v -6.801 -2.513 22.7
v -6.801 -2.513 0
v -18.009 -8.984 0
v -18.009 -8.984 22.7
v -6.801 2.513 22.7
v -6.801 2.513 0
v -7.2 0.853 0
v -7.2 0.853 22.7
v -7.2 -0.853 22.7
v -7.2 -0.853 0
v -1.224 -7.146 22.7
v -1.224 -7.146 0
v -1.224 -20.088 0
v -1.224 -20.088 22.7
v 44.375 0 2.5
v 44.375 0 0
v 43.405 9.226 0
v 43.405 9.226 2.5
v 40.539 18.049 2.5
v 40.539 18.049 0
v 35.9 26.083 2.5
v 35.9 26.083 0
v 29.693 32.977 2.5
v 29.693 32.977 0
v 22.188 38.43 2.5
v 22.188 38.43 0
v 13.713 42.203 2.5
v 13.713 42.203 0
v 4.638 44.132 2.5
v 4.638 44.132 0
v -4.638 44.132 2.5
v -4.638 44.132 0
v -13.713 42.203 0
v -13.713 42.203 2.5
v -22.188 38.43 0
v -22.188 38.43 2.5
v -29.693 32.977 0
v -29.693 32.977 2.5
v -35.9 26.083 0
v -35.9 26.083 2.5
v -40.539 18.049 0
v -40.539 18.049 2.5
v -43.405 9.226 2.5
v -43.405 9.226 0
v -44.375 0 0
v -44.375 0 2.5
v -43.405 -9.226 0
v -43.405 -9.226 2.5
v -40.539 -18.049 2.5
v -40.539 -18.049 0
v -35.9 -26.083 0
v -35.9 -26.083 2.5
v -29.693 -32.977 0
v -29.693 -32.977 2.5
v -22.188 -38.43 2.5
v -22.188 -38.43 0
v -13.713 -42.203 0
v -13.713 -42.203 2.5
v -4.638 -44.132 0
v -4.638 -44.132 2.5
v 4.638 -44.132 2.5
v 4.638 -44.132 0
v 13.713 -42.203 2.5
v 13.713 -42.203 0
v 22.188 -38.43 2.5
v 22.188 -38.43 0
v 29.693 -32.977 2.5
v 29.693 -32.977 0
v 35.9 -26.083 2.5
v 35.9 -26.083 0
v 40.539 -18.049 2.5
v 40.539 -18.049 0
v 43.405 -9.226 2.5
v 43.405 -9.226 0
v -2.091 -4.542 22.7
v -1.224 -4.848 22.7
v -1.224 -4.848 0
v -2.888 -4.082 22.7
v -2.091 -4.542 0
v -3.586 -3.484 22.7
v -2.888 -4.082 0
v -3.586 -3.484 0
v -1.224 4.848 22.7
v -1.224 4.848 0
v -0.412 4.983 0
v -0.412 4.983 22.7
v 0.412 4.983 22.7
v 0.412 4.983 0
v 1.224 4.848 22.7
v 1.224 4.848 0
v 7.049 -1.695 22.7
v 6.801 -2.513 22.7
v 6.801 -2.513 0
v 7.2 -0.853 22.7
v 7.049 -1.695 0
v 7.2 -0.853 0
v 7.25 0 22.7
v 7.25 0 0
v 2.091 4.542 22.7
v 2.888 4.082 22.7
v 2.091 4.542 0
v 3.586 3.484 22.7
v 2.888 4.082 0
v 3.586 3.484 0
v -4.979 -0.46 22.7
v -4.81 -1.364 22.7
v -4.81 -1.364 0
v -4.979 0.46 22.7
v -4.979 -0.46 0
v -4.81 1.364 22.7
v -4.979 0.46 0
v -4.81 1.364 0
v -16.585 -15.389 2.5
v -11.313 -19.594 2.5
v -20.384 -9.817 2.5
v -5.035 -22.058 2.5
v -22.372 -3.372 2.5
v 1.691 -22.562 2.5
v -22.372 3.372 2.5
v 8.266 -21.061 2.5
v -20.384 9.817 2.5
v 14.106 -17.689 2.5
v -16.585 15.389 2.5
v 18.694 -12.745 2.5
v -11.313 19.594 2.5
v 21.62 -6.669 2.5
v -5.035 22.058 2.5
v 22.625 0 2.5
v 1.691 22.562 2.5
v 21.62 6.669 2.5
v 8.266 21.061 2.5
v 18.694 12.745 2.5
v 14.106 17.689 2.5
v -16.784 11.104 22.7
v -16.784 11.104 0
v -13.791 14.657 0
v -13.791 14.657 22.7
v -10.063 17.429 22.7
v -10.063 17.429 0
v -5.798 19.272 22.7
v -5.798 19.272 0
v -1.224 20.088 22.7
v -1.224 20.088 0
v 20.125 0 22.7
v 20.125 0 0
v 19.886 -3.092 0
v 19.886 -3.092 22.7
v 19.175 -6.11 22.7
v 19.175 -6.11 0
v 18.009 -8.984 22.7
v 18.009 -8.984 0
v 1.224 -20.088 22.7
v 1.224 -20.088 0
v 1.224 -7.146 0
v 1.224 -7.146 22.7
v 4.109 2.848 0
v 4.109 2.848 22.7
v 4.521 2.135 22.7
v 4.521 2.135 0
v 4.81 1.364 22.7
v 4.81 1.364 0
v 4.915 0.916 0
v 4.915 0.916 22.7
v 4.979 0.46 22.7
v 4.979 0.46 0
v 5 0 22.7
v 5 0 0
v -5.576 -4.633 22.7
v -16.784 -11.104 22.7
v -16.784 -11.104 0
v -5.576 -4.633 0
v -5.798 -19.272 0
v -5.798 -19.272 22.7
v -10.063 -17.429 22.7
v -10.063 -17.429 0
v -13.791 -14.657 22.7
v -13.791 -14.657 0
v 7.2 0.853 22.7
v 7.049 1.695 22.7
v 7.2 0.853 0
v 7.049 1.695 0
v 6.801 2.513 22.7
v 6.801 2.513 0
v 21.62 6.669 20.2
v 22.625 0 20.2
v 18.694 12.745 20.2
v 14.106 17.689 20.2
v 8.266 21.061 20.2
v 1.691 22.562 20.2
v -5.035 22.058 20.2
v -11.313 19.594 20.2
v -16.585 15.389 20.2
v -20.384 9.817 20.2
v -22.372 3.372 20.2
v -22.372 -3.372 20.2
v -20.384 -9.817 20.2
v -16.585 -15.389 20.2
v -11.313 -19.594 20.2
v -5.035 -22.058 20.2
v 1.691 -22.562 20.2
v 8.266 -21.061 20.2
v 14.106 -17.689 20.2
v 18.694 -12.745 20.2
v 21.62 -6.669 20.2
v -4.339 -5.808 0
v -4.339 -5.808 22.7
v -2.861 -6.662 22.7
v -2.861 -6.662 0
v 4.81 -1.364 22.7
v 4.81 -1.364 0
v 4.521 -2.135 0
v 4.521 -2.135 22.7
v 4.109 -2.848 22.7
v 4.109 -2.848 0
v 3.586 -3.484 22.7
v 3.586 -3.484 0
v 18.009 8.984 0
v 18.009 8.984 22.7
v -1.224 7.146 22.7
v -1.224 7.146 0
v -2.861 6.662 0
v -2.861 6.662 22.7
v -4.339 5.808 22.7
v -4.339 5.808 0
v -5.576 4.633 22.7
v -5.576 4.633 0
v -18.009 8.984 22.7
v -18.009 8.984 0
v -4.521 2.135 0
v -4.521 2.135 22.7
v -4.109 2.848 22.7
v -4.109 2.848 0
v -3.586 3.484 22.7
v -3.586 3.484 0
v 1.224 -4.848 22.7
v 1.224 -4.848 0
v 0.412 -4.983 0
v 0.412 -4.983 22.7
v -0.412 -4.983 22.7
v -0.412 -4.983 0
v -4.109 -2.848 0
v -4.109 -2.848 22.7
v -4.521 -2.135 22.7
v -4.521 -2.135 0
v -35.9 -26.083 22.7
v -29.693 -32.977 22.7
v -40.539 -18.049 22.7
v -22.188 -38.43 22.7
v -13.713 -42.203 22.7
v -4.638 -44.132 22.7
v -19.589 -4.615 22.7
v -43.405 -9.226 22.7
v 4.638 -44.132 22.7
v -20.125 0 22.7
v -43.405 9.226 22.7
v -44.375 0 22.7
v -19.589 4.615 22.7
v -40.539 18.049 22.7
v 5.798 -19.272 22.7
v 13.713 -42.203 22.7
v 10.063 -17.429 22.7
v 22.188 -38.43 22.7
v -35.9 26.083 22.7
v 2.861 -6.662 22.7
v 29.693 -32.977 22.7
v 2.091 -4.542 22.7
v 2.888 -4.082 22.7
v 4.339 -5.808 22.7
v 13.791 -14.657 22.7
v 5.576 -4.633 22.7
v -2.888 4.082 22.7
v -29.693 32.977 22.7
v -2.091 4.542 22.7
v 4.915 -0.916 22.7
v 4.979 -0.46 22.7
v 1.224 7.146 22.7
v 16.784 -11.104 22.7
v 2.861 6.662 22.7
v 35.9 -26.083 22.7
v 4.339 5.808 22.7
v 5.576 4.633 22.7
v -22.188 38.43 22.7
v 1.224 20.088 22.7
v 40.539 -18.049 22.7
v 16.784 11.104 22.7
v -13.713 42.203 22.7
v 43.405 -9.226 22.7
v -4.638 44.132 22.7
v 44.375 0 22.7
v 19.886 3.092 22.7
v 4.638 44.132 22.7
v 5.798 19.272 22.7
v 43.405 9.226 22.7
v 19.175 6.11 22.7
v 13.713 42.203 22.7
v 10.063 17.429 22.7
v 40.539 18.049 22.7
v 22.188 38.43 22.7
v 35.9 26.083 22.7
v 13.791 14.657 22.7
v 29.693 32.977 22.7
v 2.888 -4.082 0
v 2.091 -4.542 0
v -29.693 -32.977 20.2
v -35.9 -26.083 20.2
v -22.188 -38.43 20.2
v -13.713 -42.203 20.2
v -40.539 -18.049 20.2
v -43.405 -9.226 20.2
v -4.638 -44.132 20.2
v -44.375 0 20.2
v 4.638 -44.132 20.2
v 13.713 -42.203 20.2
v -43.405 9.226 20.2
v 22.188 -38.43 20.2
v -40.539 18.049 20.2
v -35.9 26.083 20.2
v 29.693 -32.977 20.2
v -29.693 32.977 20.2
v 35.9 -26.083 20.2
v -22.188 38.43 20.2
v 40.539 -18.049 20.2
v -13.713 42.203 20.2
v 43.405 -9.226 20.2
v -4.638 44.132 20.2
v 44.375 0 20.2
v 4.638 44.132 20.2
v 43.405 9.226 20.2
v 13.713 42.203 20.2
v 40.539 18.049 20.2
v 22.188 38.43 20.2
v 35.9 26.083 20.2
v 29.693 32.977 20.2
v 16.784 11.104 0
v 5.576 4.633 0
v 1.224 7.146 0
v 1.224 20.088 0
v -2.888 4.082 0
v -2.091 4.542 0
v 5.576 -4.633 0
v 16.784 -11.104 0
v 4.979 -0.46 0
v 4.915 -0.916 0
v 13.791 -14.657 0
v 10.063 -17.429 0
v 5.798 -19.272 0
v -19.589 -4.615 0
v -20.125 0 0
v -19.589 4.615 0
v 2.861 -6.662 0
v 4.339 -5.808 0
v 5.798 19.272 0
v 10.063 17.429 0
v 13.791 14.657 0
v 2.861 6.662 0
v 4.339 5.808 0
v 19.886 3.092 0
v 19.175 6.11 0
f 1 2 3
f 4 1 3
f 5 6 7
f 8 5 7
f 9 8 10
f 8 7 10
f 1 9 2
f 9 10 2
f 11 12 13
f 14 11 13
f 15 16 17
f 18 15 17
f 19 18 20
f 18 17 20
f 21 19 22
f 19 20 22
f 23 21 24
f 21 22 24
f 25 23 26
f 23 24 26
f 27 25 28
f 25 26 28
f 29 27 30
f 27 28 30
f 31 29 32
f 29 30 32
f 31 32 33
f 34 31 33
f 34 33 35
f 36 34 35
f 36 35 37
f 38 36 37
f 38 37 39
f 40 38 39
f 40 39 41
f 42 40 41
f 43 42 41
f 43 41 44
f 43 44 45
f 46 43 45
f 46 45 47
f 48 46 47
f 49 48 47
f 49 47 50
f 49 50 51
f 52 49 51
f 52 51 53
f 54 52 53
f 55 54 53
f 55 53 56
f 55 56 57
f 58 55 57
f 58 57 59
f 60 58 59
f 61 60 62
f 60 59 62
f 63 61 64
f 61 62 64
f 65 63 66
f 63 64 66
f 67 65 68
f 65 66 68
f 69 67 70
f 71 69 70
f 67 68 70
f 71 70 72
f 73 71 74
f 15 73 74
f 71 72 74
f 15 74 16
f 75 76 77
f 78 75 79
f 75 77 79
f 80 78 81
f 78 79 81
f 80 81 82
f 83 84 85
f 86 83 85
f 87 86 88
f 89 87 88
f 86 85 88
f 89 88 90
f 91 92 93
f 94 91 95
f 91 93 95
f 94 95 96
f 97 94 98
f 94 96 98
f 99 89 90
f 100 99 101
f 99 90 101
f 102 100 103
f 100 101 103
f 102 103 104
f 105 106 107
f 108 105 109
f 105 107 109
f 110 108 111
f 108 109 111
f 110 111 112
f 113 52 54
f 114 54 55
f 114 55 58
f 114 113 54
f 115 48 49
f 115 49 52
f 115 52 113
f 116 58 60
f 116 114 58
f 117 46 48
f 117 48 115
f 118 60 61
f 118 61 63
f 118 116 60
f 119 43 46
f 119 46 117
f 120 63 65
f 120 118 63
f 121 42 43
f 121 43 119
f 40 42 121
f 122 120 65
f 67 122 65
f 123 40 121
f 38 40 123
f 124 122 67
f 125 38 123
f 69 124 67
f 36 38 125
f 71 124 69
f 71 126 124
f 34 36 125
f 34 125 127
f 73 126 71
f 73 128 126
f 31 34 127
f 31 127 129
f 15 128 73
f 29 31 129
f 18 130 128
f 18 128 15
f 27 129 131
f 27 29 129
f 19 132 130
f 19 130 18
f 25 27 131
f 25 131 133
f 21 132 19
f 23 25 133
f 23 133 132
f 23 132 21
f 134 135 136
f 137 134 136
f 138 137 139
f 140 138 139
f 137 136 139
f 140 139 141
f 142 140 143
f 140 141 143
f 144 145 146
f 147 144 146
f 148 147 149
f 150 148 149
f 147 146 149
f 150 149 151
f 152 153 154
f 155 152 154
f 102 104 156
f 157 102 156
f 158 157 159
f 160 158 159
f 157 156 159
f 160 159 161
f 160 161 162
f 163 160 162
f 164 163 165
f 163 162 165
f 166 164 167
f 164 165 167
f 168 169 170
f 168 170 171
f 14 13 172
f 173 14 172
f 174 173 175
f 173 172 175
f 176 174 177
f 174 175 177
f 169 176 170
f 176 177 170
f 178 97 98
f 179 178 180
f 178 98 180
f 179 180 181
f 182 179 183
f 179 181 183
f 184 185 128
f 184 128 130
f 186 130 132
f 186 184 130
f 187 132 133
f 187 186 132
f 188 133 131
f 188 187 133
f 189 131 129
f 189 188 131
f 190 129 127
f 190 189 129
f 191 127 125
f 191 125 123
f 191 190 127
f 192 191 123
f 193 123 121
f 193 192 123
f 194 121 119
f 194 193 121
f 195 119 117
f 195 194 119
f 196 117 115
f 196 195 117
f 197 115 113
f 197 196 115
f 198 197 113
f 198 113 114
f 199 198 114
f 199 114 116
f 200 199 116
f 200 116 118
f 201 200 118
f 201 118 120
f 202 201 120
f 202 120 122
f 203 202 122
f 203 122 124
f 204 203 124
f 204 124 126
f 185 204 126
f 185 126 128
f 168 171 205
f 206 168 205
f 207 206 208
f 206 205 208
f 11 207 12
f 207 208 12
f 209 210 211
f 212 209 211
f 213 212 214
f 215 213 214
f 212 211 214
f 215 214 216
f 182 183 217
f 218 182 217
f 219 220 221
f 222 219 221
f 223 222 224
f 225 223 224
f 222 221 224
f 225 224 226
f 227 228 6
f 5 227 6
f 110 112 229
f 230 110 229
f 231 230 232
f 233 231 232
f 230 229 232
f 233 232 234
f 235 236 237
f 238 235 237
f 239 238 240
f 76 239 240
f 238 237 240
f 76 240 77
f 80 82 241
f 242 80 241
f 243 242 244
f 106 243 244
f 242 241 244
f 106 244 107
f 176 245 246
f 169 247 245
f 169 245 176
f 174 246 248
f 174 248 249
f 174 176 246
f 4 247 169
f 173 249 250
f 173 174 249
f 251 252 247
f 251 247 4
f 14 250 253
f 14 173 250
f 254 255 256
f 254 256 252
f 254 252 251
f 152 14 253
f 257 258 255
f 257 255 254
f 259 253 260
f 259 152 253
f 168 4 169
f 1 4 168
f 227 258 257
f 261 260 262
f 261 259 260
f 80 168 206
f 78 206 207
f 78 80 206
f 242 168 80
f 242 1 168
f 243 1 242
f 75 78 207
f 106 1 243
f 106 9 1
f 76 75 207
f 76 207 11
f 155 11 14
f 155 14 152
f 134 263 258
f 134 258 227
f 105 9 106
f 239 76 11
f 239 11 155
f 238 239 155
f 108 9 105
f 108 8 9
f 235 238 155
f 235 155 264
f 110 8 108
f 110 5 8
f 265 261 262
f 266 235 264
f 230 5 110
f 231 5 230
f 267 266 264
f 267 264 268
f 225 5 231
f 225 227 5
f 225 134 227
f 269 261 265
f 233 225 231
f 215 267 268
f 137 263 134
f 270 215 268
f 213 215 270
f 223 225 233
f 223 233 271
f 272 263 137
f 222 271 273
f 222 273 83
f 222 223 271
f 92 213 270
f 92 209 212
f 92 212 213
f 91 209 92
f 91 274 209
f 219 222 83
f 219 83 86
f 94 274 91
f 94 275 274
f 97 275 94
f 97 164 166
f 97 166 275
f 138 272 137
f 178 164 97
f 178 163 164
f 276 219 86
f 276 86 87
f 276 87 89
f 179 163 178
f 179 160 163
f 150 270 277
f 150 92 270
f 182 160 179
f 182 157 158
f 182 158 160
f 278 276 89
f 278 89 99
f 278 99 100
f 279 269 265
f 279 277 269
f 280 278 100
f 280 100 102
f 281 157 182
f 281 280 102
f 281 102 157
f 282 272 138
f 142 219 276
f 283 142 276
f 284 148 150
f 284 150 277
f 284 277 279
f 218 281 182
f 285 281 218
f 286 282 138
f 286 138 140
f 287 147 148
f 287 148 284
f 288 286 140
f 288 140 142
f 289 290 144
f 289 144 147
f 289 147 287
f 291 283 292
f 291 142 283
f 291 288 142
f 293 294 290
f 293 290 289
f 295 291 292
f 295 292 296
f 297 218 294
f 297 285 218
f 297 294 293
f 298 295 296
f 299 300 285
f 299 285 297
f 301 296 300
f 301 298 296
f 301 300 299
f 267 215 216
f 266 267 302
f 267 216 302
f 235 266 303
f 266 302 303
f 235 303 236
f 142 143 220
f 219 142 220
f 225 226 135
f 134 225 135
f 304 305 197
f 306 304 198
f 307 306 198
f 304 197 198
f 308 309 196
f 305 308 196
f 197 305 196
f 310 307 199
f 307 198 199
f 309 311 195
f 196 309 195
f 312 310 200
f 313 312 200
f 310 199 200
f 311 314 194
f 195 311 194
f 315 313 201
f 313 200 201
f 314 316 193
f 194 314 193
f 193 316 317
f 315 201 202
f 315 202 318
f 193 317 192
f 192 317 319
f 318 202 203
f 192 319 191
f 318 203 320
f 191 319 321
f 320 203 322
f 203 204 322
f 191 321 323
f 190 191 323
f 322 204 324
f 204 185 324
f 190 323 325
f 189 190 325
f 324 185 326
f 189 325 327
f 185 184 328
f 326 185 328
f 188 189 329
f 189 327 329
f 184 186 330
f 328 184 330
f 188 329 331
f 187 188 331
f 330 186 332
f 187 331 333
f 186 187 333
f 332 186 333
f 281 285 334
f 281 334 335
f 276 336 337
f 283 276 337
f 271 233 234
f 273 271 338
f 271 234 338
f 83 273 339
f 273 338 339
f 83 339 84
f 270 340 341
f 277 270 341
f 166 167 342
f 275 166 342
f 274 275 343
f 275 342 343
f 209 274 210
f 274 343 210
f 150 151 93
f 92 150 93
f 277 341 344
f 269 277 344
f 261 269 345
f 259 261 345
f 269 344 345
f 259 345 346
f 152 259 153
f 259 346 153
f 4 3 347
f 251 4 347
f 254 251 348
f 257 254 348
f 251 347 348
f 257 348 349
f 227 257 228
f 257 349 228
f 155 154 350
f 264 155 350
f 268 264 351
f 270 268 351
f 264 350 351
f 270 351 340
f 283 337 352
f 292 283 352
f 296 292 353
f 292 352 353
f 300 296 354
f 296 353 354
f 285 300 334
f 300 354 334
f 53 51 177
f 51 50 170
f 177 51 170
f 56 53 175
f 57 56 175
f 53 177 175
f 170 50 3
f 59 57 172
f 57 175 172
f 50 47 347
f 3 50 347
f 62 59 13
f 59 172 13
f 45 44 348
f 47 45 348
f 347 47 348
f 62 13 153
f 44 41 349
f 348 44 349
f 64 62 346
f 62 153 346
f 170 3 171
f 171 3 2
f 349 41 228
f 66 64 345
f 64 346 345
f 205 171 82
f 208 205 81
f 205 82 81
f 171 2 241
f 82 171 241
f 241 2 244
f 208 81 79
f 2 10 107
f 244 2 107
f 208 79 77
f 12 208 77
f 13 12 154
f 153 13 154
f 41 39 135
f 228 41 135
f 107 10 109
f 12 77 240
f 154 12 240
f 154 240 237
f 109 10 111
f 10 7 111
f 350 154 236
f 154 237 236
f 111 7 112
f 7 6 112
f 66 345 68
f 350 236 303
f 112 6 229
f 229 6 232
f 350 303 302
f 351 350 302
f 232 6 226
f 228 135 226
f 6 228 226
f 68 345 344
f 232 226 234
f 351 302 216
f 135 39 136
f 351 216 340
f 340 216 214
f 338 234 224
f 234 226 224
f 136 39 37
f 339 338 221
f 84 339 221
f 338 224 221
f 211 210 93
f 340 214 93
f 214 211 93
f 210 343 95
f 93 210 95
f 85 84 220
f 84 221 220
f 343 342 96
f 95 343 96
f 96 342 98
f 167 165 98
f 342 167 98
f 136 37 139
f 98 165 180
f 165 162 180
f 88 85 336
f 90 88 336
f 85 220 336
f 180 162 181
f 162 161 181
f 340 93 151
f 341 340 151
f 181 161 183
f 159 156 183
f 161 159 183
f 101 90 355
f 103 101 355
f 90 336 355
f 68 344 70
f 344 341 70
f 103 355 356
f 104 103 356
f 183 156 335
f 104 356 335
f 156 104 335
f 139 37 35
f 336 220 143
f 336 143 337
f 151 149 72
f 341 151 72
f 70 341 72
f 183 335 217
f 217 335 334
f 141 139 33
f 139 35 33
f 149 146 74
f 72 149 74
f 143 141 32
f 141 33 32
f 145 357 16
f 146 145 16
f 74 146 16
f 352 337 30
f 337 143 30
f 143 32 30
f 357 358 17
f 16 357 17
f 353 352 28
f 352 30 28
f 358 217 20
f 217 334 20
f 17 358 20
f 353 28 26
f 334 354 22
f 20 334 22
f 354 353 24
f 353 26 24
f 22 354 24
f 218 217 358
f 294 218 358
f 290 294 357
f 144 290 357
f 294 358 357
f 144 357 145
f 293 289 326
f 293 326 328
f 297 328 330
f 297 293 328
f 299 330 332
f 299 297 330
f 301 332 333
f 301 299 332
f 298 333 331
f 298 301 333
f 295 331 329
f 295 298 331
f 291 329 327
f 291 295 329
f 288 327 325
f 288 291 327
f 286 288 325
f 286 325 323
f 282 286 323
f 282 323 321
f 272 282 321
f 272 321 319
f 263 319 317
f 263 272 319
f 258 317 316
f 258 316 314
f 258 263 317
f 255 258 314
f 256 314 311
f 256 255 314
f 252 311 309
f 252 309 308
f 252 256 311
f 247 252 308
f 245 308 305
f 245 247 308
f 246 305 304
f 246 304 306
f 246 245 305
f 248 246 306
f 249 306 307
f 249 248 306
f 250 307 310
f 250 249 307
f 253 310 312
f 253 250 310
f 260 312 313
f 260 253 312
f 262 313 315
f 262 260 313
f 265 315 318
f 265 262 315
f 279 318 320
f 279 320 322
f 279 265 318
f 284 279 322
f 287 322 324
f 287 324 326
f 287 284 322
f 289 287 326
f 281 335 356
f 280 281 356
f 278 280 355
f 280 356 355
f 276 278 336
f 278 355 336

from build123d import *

# Parameters (mm, degrees)
F0_R     = 44.375
F1_DEPTH = 22.7
F2_R     = 44.375
F2_R_2   = 22.625
F3_DEPTH = 20.2
F4_R     = 44.375
F4_R_2   = 22.625
F5_DEPTH = 2.5


with BuildPart() as f1:
    # F0 (on Top) → F1 (new body)
    with BuildSketch(Plane.XY):
        Circle(F0_R)
        with BuildLine():
            ThreePointArc((18.0086459229, 8.9835570362), (19.5887674982, 4.6147386601), (20.125, 0))
            ThreePointArc((20.125, 0), (19.5887674982, -4.6147386601), (18.0086459229, -8.9835570362))
            Line((18.0086459229, -8.9835570362), (19.3430855029, -9.753996087))
            Line((19.3430855029, -9.753996087), (18.1187511512, -11.8746053896))
            Line((18.1187511512, -11.8746053896), (16.7843115712, -11.1041663389))
            ThreePointArc((16.7843115712, -11.1041663389), (10.0625, -17.4287612512), (1.2243343517, -20.0877233751))
            Line((1.2243343517, -20.0877233751), (1.2243343517, -21.6286014766))
            Line((1.2243343517, -21.6286014766), (-1.2243343517, -21.6286014766))
            Line((-1.2243343517, -21.6286014766), (-1.2243343517, -20.0877233751))
            ThreePointArc((-1.2243343517, -20.0877233751), (-10.0625, -17.4287612512), (-16.7843115712, -11.1041663389))
            Line((-16.7843115712, -11.1041663389), (-18.1187511512, -11.8746053896))
            Line((-18.1187511512, -11.8746053896), (-19.3430855029, -9.753996087))
            Line((-19.3430855029, -9.753996087), (-18.0086459229, -8.9835570362))
            ThreePointArc((-18.0086459229, -8.9835570362), (-20.125, 0), (-18.0086459229, 8.9835570362))
            Line((-18.0086459229, 8.9835570362), (-19.3430855029, 9.753996087))
            Line((-19.3430855029, 9.753996087), (-18.1187511512, 11.8746053896))
            Line((-18.1187511512, 11.8746053896), (-16.7843115712, 11.1041663389))
            ThreePointArc((-16.7843115712, 11.1041663389), (-10.0625, 17.4287612512), (-1.2243343517, 20.0877233751))
            Line((-1.2243343517, 20.0877233751), (-1.2243343517, 21.6286014766))
            Line((-1.2243343517, 21.6286014766), (1.2243343517, 21.6286014766))
            Line((1.2243343517, 21.6286014766), (1.2243343517, 20.0877233751))
            ThreePointArc((1.2243343517, 20.0877233751), (10.0625, 17.4287612512), (16.7843115712, 11.1041663389))
            Line((16.7843115712, 11.1041663389), (18.1187511512, 11.8746053896))
            Line((18.1187511512, 11.8746053896), (19.3430855029, 9.753996087))
            Line((19.3430855029, 9.753996087), (18.0086459229, 8.9835570362))
        make_face(mode=Mode.SUBTRACT)
        with BuildLine():
            Line((-5.5763406448, 4.6332413075), (-16.7843115712, 11.1041663389))
            ThreePointArc((-16.7843115712, 11.1041663389), (-17.4287612512, 10.0625), (-18.0086459229, 8.9835570362))
            Line((-18.0086459229, 8.9835570362), (-6.8006749965, 2.5126320048))
            ThreePointArc((-6.8006749965, 2.5126320048), (-6.2786841774, 3.625), (-5.5763406448, 4.6332413075))
        make_face()
        with BuildLine():
            Line((1.2243343517, 7.1458733123), (1.2243343517, 20.0877233751))
            ThreePointArc((1.2243343517, 20.0877233751), (0, 20.125), (-1.2243343517, 20.0877233751))
            Line((-1.2243343517, 20.0877233751), (-1.2243343517, 7.1458733123))
            ThreePointArc((-1.2243343517, 7.1458733123), (0, 7.25), (1.2243343517, 7.1458733123))
        make_face()
        with BuildLine():
            Line((6.8006749965, 2.5126320048), (18.0086459229, 8.9835570362))
            ThreePointArc((18.0086459229, 8.9835570362), (17.4287612512, 10.0625), (16.7843115712, 11.1041663389))
            Line((16.7843115712, 11.1041663389), (5.5763406448, 4.6332413075))
            ThreePointArc((5.5763406448, 4.6332413075), (6.2786841774, 3.625), (6.8006749965, 2.5126320048))
        make_face()
        with BuildLine():
            ThreePointArc((16.7843115712, -11.1041663389), (17.4287612512, -10.0625), (18.0086459229, -8.9835570362))
            Line((18.0086459229, -8.9835570362), (6.8006749965, -2.5126320048))
            ThreePointArc((6.8006749965, -2.5126320048), (6.2786841774, -3.625), (5.5763406448, -4.6332413075))
            Line((5.5763406448, -4.6332413075), (16.7843115712, -11.1041663389))
        make_face()
        with BuildLine():
            ThreePointArc((-18.0086459229, -8.9835570362), (-17.4287612512, -10.0625), (-16.7843115712, -11.1041663389))
            Line((-16.7843115712, -11.1041663389), (-5.5763406448, -4.6332413075))
            ThreePointArc((-5.5763406448, -4.6332413075), (-6.2786841774, -3.625), (-6.8006749965, -2.5126320048))
            Line((-6.8006749965, -2.5126320048), (-18.0086459229, -8.9835570362))
        make_face()
        with BuildLine():
            ThreePointArc((-1.2243343517, -20.0877233751), (0, -20.125), (1.2243343517, -20.0877233751))
            Line((1.2243343517, -20.0877233751), (1.2243343517, -7.1458733123))
            ThreePointArc((1.2243343517, -7.1458733123), (0, -7.25), (-1.2243343517, -7.1458733123))
            Line((-1.2243343517, -7.1458733123), (-1.2243343517, -20.0877233751))
        make_face()
        with BuildLine():
            ThreePointArc((-18.0086459229, 8.9835570362), (-17.4287612512, 10.0625), (-16.7843115712, 11.1041663389))
            Line((-16.7843115712, 11.1041663389), (-18.1187511512, 11.8746053896))
            Line((-18.1187511512, 11.8746053896), (-19.3430855029, 9.753996087))
            Line((-19.3430855029, 9.753996087), (-18.0086459229, 8.9835570362))
        make_face()
        with BuildLine():
            ThreePointArc((-1.2243343517, 20.0877233751), (0, 20.125), (1.2243343517, 20.0877233751))
            Line((1.2243343517, 20.0877233751), (1.2243343517, 21.6286014766))
            Line((1.2243343517, 21.6286014766), (-1.2243343517, 21.6286014766))
            Line((-1.2243343517, 21.6286014766), (-1.2243343517, 20.0877233751))
        make_face()
        with BuildLine():
            ThreePointArc((16.7843115712, 11.1041663389), (17.4287612512, 10.0625), (18.0086459229, 8.9835570362))
            Line((18.0086459229, 8.9835570362), (19.3430855029, 9.753996087))
            Line((19.3430855029, 9.753996087), (18.1187511512, 11.8746053896))
            Line((18.1187511512, 11.8746053896), (16.7843115712, 11.1041663389))
        make_face()
        with BuildLine():
            Line((19.3430855029, -9.753996087), (18.0086459229, -8.9835570362))
            ThreePointArc((18.0086459229, -8.9835570362), (17.4287612512, -10.0625), (16.7843115712, -11.1041663389))
            Line((16.7843115712, -11.1041663389), (18.1187511512, -11.8746053896))
            Line((18.1187511512, -11.8746053896), (19.3430855029, -9.753996087))
        make_face()
        with BuildLine():
            Line((1.2243343517, -21.6286014766), (1.2243343517, -20.0877233751))
            ThreePointArc((1.2243343517, -20.0877233751), (0, -20.125), (-1.2243343517, -20.0877233751))
            Line((-1.2243343517, -20.0877233751), (-1.2243343517, -21.6286014766))
            Line((-1.2243343517, -21.6286014766), (1.2243343517, -21.6286014766))
        make_face()
        with BuildLine():
            Line((-18.1187511512, -11.8746053896), (-16.7843115712, -11.1041663389))
            ThreePointArc((-16.7843115712, -11.1041663389), (-17.4287612512, -10.0625), (-18.0086459229, -8.9835570362))
            Line((-18.0086459229, -8.9835570362), (-19.3430855029, -9.753996087))
            Line((-19.3430855029, -9.753996087), (-18.1187511512, -11.8746053896))
        make_face()
        with BuildLine():
            Line((-3.5861365347, 3.4841964288), (-5.5763406448, 4.6332413075))
            ThreePointArc((-5.5763406448, 4.6332413075), (-6.2786841774, 3.625), (-6.8006749965, 2.5126320048))
            Line((-6.8006749965, 2.5126320048), (-4.8104708865, 1.3635871261))
            ThreePointArc((-4.8104708865, 1.3635871261), (-4.3301270189, 2.5), (-3.5861365347, 3.4841964288))
        make_face()
        with BuildLine():
            Line((-4.8104708865, 1.3635871261), (-6.8006749965, 2.5126320048))
            ThreePointArc((-6.8006749965, 2.5126320048), (-7.25, 0), (-6.8006749965, -2.5126320048))
            Line((-6.8006749965, -2.5126320048), (-4.8104708865, -1.3635871261))
            ThreePointArc((-4.8104708865, -1.3635871261), (-5, 0), (-4.8104708865, 1.3635871261))
        make_face()
        with BuildLine():
            ThreePointArc((-6.8006749965, -2.5126320048), (-6.2786841774, -3.625), (-5.5763406448, -4.6332413075))
            Line((-5.5763406448, -4.6332413075), (-3.5861365347, -3.4841964288))
            ThreePointArc((-3.5861365347, -3.4841964288), (-4.3301270189, -2.5), (-4.8104708865, -1.3635871261))
            Line((-4.8104708865, -1.3635871261), (-6.8006749965, -2.5126320048))
        make_face()
        with BuildLine():
            ThreePointArc((-5.5763406448, -4.6332413075), (-3.625, -6.2786841774), (-1.2243343517, -7.1458733123))
            Line((-1.2243343517, -7.1458733123), (-1.2243343517, -4.8477835549))
            ThreePointArc((-1.2243343517, -4.8477835549), (-2.5, -4.3301270189), (-3.5861365347, -3.4841964288))
            Line((-3.5861365347, -3.4841964288), (-5.5763406448, -4.6332413075))
        make_face()
        with BuildLine():
            ThreePointArc((-1.2243343517, -7.1458733123), (0, -7.25), (1.2243343517, -7.1458733123))
            Line((1.2243343517, -7.1458733123), (1.2243343517, -4.8477835549))
            ThreePointArc((1.2243343517, -4.8477835549), (0, -5), (-1.2243343517, -4.8477835549))
            Line((-1.2243343517, -4.8477835549), (-1.2243343517, -7.1458733123))
        make_face()
        with BuildLine():
            ThreePointArc((5.5763406448, -4.6332413075), (6.2786841774, -3.625), (6.8006749965, -2.5126320048))
            Line((6.8006749965, -2.5126320048), (4.8104708865, -1.3635871261))
            ThreePointArc((4.8104708865, -1.3635871261), (4.3301270189, -2.5), (3.5861365347, -3.4841964288))
            Line((3.5861365347, -3.4841964288), (5.5763406448, -4.6332413075))
        make_face()
        with BuildLine():
            ThreePointArc((7.25, 0), (7.1367847706, 1.2762457199), (6.8006749965, 2.5126320048))
            Line((6.8006749965, 2.5126320048), (4.8104708865, 1.3635871261))
            ThreePointArc((4.8104708865, 1.3635871261), (4.9523910605, 0.6883478654), (5, 0))
            ThreePointArc((5, 0), (4.9523910605, -0.6883478654), (4.8104708865, -1.3635871261))
            Line((4.8104708865, -1.3635871261), (6.8006749965, -2.5126320048))
            ThreePointArc((6.8006749965, -2.5126320048), (7.1367847706, -1.2762457199), (7.25, 0))
        make_face()
        with BuildLine():
            Line((4.8104708865, 1.3635871261), (6.8006749965, 2.5126320048))
            ThreePointArc((6.8006749965, 2.5126320048), (6.2786841774, 3.625), (5.5763406448, 4.6332413075))
            Line((5.5763406448, 4.6332413075), (3.5861365347, 3.4841964288))
            ThreePointArc((3.5861365347, 3.4841964288), (4.3301270189, 2.5), (4.8104708865, 1.3635871261))
        make_face()
        with BuildLine():
            Line((3.5861365347, 3.4841964288), (5.5763406448, 4.6332413075))
            ThreePointArc((5.5763406448, 4.6332413075), (3.625, 6.2786841774), (1.2243343517, 7.1458733123))
            Line((1.2243343517, 7.1458733123), (1.2243343517, 4.8477835549))
            ThreePointArc((1.2243343517, 4.8477835549), (2.5, 4.3301270189), (3.5861365347, 3.4841964288))
        make_face()
        with BuildLine():
            Line((-1.2243343517, 4.8477835549), (-1.2243343517, 7.1458733123))
            ThreePointArc((-1.2243343517, 7.1458733123), (-3.625, 6.2786841774), (-5.5763406448, 4.6332413075))
            Line((-5.5763406448, 4.6332413075), (-3.5861365347, 3.4841964288))
            ThreePointArc((-3.5861365347, 3.4841964288), (-2.5, 4.3301270189), (-1.2243343517, 4.8477835549))
        make_face()
        with BuildLine():
            Line((1.2243343517, 4.8477835549), (1.2243343517, 7.1458733123))
            ThreePointArc((1.2243343517, 7.1458733123), (0, 7.25), (-1.2243343517, 7.1458733123))
            Line((-1.2243343517, 7.1458733123), (-1.2243343517, 4.8477835549))
            ThreePointArc((-1.2243343517, 4.8477835549), (0, 5), (1.2243343517, 4.8477835549))
        make_face()
        with BuildLine():
            ThreePointArc((1.2243343517, -7.1458733123), (3.625, -6.2786841774), (5.5763406448, -4.6332413075))
            Line((5.5763406448, -4.6332413075), (3.5861365347, -3.4841964288))
            ThreePointArc((3.5861365347, -3.4841964288), (2.5, -4.3301270189), (1.2243343517, -4.8477835549))
            Line((1.2243343517, -4.8477835549), (1.2243343517, -7.1458733123))
        make_face()
    extrude(amount=F1_DEPTH)

    # F2 (on face) → F3 (cut)
    with BuildSketch(Plane.XY.offset(22.7)):
        Circle(F2_R)
        Circle(F2_R_2, mode=Mode.SUBTRACT)
    extrude(amount=-F3_DEPTH, mode=Mode.SUBTRACT)

    # F4 (on face) → F5 (join)
    with BuildSketch(Plane.XY.offset(22.7)):
        Circle(F4_R)
        Circle(F4_R_2, mode=Mode.SUBTRACT)
    extrude(amount=-F5_DEPTH)


solid = f1.part
